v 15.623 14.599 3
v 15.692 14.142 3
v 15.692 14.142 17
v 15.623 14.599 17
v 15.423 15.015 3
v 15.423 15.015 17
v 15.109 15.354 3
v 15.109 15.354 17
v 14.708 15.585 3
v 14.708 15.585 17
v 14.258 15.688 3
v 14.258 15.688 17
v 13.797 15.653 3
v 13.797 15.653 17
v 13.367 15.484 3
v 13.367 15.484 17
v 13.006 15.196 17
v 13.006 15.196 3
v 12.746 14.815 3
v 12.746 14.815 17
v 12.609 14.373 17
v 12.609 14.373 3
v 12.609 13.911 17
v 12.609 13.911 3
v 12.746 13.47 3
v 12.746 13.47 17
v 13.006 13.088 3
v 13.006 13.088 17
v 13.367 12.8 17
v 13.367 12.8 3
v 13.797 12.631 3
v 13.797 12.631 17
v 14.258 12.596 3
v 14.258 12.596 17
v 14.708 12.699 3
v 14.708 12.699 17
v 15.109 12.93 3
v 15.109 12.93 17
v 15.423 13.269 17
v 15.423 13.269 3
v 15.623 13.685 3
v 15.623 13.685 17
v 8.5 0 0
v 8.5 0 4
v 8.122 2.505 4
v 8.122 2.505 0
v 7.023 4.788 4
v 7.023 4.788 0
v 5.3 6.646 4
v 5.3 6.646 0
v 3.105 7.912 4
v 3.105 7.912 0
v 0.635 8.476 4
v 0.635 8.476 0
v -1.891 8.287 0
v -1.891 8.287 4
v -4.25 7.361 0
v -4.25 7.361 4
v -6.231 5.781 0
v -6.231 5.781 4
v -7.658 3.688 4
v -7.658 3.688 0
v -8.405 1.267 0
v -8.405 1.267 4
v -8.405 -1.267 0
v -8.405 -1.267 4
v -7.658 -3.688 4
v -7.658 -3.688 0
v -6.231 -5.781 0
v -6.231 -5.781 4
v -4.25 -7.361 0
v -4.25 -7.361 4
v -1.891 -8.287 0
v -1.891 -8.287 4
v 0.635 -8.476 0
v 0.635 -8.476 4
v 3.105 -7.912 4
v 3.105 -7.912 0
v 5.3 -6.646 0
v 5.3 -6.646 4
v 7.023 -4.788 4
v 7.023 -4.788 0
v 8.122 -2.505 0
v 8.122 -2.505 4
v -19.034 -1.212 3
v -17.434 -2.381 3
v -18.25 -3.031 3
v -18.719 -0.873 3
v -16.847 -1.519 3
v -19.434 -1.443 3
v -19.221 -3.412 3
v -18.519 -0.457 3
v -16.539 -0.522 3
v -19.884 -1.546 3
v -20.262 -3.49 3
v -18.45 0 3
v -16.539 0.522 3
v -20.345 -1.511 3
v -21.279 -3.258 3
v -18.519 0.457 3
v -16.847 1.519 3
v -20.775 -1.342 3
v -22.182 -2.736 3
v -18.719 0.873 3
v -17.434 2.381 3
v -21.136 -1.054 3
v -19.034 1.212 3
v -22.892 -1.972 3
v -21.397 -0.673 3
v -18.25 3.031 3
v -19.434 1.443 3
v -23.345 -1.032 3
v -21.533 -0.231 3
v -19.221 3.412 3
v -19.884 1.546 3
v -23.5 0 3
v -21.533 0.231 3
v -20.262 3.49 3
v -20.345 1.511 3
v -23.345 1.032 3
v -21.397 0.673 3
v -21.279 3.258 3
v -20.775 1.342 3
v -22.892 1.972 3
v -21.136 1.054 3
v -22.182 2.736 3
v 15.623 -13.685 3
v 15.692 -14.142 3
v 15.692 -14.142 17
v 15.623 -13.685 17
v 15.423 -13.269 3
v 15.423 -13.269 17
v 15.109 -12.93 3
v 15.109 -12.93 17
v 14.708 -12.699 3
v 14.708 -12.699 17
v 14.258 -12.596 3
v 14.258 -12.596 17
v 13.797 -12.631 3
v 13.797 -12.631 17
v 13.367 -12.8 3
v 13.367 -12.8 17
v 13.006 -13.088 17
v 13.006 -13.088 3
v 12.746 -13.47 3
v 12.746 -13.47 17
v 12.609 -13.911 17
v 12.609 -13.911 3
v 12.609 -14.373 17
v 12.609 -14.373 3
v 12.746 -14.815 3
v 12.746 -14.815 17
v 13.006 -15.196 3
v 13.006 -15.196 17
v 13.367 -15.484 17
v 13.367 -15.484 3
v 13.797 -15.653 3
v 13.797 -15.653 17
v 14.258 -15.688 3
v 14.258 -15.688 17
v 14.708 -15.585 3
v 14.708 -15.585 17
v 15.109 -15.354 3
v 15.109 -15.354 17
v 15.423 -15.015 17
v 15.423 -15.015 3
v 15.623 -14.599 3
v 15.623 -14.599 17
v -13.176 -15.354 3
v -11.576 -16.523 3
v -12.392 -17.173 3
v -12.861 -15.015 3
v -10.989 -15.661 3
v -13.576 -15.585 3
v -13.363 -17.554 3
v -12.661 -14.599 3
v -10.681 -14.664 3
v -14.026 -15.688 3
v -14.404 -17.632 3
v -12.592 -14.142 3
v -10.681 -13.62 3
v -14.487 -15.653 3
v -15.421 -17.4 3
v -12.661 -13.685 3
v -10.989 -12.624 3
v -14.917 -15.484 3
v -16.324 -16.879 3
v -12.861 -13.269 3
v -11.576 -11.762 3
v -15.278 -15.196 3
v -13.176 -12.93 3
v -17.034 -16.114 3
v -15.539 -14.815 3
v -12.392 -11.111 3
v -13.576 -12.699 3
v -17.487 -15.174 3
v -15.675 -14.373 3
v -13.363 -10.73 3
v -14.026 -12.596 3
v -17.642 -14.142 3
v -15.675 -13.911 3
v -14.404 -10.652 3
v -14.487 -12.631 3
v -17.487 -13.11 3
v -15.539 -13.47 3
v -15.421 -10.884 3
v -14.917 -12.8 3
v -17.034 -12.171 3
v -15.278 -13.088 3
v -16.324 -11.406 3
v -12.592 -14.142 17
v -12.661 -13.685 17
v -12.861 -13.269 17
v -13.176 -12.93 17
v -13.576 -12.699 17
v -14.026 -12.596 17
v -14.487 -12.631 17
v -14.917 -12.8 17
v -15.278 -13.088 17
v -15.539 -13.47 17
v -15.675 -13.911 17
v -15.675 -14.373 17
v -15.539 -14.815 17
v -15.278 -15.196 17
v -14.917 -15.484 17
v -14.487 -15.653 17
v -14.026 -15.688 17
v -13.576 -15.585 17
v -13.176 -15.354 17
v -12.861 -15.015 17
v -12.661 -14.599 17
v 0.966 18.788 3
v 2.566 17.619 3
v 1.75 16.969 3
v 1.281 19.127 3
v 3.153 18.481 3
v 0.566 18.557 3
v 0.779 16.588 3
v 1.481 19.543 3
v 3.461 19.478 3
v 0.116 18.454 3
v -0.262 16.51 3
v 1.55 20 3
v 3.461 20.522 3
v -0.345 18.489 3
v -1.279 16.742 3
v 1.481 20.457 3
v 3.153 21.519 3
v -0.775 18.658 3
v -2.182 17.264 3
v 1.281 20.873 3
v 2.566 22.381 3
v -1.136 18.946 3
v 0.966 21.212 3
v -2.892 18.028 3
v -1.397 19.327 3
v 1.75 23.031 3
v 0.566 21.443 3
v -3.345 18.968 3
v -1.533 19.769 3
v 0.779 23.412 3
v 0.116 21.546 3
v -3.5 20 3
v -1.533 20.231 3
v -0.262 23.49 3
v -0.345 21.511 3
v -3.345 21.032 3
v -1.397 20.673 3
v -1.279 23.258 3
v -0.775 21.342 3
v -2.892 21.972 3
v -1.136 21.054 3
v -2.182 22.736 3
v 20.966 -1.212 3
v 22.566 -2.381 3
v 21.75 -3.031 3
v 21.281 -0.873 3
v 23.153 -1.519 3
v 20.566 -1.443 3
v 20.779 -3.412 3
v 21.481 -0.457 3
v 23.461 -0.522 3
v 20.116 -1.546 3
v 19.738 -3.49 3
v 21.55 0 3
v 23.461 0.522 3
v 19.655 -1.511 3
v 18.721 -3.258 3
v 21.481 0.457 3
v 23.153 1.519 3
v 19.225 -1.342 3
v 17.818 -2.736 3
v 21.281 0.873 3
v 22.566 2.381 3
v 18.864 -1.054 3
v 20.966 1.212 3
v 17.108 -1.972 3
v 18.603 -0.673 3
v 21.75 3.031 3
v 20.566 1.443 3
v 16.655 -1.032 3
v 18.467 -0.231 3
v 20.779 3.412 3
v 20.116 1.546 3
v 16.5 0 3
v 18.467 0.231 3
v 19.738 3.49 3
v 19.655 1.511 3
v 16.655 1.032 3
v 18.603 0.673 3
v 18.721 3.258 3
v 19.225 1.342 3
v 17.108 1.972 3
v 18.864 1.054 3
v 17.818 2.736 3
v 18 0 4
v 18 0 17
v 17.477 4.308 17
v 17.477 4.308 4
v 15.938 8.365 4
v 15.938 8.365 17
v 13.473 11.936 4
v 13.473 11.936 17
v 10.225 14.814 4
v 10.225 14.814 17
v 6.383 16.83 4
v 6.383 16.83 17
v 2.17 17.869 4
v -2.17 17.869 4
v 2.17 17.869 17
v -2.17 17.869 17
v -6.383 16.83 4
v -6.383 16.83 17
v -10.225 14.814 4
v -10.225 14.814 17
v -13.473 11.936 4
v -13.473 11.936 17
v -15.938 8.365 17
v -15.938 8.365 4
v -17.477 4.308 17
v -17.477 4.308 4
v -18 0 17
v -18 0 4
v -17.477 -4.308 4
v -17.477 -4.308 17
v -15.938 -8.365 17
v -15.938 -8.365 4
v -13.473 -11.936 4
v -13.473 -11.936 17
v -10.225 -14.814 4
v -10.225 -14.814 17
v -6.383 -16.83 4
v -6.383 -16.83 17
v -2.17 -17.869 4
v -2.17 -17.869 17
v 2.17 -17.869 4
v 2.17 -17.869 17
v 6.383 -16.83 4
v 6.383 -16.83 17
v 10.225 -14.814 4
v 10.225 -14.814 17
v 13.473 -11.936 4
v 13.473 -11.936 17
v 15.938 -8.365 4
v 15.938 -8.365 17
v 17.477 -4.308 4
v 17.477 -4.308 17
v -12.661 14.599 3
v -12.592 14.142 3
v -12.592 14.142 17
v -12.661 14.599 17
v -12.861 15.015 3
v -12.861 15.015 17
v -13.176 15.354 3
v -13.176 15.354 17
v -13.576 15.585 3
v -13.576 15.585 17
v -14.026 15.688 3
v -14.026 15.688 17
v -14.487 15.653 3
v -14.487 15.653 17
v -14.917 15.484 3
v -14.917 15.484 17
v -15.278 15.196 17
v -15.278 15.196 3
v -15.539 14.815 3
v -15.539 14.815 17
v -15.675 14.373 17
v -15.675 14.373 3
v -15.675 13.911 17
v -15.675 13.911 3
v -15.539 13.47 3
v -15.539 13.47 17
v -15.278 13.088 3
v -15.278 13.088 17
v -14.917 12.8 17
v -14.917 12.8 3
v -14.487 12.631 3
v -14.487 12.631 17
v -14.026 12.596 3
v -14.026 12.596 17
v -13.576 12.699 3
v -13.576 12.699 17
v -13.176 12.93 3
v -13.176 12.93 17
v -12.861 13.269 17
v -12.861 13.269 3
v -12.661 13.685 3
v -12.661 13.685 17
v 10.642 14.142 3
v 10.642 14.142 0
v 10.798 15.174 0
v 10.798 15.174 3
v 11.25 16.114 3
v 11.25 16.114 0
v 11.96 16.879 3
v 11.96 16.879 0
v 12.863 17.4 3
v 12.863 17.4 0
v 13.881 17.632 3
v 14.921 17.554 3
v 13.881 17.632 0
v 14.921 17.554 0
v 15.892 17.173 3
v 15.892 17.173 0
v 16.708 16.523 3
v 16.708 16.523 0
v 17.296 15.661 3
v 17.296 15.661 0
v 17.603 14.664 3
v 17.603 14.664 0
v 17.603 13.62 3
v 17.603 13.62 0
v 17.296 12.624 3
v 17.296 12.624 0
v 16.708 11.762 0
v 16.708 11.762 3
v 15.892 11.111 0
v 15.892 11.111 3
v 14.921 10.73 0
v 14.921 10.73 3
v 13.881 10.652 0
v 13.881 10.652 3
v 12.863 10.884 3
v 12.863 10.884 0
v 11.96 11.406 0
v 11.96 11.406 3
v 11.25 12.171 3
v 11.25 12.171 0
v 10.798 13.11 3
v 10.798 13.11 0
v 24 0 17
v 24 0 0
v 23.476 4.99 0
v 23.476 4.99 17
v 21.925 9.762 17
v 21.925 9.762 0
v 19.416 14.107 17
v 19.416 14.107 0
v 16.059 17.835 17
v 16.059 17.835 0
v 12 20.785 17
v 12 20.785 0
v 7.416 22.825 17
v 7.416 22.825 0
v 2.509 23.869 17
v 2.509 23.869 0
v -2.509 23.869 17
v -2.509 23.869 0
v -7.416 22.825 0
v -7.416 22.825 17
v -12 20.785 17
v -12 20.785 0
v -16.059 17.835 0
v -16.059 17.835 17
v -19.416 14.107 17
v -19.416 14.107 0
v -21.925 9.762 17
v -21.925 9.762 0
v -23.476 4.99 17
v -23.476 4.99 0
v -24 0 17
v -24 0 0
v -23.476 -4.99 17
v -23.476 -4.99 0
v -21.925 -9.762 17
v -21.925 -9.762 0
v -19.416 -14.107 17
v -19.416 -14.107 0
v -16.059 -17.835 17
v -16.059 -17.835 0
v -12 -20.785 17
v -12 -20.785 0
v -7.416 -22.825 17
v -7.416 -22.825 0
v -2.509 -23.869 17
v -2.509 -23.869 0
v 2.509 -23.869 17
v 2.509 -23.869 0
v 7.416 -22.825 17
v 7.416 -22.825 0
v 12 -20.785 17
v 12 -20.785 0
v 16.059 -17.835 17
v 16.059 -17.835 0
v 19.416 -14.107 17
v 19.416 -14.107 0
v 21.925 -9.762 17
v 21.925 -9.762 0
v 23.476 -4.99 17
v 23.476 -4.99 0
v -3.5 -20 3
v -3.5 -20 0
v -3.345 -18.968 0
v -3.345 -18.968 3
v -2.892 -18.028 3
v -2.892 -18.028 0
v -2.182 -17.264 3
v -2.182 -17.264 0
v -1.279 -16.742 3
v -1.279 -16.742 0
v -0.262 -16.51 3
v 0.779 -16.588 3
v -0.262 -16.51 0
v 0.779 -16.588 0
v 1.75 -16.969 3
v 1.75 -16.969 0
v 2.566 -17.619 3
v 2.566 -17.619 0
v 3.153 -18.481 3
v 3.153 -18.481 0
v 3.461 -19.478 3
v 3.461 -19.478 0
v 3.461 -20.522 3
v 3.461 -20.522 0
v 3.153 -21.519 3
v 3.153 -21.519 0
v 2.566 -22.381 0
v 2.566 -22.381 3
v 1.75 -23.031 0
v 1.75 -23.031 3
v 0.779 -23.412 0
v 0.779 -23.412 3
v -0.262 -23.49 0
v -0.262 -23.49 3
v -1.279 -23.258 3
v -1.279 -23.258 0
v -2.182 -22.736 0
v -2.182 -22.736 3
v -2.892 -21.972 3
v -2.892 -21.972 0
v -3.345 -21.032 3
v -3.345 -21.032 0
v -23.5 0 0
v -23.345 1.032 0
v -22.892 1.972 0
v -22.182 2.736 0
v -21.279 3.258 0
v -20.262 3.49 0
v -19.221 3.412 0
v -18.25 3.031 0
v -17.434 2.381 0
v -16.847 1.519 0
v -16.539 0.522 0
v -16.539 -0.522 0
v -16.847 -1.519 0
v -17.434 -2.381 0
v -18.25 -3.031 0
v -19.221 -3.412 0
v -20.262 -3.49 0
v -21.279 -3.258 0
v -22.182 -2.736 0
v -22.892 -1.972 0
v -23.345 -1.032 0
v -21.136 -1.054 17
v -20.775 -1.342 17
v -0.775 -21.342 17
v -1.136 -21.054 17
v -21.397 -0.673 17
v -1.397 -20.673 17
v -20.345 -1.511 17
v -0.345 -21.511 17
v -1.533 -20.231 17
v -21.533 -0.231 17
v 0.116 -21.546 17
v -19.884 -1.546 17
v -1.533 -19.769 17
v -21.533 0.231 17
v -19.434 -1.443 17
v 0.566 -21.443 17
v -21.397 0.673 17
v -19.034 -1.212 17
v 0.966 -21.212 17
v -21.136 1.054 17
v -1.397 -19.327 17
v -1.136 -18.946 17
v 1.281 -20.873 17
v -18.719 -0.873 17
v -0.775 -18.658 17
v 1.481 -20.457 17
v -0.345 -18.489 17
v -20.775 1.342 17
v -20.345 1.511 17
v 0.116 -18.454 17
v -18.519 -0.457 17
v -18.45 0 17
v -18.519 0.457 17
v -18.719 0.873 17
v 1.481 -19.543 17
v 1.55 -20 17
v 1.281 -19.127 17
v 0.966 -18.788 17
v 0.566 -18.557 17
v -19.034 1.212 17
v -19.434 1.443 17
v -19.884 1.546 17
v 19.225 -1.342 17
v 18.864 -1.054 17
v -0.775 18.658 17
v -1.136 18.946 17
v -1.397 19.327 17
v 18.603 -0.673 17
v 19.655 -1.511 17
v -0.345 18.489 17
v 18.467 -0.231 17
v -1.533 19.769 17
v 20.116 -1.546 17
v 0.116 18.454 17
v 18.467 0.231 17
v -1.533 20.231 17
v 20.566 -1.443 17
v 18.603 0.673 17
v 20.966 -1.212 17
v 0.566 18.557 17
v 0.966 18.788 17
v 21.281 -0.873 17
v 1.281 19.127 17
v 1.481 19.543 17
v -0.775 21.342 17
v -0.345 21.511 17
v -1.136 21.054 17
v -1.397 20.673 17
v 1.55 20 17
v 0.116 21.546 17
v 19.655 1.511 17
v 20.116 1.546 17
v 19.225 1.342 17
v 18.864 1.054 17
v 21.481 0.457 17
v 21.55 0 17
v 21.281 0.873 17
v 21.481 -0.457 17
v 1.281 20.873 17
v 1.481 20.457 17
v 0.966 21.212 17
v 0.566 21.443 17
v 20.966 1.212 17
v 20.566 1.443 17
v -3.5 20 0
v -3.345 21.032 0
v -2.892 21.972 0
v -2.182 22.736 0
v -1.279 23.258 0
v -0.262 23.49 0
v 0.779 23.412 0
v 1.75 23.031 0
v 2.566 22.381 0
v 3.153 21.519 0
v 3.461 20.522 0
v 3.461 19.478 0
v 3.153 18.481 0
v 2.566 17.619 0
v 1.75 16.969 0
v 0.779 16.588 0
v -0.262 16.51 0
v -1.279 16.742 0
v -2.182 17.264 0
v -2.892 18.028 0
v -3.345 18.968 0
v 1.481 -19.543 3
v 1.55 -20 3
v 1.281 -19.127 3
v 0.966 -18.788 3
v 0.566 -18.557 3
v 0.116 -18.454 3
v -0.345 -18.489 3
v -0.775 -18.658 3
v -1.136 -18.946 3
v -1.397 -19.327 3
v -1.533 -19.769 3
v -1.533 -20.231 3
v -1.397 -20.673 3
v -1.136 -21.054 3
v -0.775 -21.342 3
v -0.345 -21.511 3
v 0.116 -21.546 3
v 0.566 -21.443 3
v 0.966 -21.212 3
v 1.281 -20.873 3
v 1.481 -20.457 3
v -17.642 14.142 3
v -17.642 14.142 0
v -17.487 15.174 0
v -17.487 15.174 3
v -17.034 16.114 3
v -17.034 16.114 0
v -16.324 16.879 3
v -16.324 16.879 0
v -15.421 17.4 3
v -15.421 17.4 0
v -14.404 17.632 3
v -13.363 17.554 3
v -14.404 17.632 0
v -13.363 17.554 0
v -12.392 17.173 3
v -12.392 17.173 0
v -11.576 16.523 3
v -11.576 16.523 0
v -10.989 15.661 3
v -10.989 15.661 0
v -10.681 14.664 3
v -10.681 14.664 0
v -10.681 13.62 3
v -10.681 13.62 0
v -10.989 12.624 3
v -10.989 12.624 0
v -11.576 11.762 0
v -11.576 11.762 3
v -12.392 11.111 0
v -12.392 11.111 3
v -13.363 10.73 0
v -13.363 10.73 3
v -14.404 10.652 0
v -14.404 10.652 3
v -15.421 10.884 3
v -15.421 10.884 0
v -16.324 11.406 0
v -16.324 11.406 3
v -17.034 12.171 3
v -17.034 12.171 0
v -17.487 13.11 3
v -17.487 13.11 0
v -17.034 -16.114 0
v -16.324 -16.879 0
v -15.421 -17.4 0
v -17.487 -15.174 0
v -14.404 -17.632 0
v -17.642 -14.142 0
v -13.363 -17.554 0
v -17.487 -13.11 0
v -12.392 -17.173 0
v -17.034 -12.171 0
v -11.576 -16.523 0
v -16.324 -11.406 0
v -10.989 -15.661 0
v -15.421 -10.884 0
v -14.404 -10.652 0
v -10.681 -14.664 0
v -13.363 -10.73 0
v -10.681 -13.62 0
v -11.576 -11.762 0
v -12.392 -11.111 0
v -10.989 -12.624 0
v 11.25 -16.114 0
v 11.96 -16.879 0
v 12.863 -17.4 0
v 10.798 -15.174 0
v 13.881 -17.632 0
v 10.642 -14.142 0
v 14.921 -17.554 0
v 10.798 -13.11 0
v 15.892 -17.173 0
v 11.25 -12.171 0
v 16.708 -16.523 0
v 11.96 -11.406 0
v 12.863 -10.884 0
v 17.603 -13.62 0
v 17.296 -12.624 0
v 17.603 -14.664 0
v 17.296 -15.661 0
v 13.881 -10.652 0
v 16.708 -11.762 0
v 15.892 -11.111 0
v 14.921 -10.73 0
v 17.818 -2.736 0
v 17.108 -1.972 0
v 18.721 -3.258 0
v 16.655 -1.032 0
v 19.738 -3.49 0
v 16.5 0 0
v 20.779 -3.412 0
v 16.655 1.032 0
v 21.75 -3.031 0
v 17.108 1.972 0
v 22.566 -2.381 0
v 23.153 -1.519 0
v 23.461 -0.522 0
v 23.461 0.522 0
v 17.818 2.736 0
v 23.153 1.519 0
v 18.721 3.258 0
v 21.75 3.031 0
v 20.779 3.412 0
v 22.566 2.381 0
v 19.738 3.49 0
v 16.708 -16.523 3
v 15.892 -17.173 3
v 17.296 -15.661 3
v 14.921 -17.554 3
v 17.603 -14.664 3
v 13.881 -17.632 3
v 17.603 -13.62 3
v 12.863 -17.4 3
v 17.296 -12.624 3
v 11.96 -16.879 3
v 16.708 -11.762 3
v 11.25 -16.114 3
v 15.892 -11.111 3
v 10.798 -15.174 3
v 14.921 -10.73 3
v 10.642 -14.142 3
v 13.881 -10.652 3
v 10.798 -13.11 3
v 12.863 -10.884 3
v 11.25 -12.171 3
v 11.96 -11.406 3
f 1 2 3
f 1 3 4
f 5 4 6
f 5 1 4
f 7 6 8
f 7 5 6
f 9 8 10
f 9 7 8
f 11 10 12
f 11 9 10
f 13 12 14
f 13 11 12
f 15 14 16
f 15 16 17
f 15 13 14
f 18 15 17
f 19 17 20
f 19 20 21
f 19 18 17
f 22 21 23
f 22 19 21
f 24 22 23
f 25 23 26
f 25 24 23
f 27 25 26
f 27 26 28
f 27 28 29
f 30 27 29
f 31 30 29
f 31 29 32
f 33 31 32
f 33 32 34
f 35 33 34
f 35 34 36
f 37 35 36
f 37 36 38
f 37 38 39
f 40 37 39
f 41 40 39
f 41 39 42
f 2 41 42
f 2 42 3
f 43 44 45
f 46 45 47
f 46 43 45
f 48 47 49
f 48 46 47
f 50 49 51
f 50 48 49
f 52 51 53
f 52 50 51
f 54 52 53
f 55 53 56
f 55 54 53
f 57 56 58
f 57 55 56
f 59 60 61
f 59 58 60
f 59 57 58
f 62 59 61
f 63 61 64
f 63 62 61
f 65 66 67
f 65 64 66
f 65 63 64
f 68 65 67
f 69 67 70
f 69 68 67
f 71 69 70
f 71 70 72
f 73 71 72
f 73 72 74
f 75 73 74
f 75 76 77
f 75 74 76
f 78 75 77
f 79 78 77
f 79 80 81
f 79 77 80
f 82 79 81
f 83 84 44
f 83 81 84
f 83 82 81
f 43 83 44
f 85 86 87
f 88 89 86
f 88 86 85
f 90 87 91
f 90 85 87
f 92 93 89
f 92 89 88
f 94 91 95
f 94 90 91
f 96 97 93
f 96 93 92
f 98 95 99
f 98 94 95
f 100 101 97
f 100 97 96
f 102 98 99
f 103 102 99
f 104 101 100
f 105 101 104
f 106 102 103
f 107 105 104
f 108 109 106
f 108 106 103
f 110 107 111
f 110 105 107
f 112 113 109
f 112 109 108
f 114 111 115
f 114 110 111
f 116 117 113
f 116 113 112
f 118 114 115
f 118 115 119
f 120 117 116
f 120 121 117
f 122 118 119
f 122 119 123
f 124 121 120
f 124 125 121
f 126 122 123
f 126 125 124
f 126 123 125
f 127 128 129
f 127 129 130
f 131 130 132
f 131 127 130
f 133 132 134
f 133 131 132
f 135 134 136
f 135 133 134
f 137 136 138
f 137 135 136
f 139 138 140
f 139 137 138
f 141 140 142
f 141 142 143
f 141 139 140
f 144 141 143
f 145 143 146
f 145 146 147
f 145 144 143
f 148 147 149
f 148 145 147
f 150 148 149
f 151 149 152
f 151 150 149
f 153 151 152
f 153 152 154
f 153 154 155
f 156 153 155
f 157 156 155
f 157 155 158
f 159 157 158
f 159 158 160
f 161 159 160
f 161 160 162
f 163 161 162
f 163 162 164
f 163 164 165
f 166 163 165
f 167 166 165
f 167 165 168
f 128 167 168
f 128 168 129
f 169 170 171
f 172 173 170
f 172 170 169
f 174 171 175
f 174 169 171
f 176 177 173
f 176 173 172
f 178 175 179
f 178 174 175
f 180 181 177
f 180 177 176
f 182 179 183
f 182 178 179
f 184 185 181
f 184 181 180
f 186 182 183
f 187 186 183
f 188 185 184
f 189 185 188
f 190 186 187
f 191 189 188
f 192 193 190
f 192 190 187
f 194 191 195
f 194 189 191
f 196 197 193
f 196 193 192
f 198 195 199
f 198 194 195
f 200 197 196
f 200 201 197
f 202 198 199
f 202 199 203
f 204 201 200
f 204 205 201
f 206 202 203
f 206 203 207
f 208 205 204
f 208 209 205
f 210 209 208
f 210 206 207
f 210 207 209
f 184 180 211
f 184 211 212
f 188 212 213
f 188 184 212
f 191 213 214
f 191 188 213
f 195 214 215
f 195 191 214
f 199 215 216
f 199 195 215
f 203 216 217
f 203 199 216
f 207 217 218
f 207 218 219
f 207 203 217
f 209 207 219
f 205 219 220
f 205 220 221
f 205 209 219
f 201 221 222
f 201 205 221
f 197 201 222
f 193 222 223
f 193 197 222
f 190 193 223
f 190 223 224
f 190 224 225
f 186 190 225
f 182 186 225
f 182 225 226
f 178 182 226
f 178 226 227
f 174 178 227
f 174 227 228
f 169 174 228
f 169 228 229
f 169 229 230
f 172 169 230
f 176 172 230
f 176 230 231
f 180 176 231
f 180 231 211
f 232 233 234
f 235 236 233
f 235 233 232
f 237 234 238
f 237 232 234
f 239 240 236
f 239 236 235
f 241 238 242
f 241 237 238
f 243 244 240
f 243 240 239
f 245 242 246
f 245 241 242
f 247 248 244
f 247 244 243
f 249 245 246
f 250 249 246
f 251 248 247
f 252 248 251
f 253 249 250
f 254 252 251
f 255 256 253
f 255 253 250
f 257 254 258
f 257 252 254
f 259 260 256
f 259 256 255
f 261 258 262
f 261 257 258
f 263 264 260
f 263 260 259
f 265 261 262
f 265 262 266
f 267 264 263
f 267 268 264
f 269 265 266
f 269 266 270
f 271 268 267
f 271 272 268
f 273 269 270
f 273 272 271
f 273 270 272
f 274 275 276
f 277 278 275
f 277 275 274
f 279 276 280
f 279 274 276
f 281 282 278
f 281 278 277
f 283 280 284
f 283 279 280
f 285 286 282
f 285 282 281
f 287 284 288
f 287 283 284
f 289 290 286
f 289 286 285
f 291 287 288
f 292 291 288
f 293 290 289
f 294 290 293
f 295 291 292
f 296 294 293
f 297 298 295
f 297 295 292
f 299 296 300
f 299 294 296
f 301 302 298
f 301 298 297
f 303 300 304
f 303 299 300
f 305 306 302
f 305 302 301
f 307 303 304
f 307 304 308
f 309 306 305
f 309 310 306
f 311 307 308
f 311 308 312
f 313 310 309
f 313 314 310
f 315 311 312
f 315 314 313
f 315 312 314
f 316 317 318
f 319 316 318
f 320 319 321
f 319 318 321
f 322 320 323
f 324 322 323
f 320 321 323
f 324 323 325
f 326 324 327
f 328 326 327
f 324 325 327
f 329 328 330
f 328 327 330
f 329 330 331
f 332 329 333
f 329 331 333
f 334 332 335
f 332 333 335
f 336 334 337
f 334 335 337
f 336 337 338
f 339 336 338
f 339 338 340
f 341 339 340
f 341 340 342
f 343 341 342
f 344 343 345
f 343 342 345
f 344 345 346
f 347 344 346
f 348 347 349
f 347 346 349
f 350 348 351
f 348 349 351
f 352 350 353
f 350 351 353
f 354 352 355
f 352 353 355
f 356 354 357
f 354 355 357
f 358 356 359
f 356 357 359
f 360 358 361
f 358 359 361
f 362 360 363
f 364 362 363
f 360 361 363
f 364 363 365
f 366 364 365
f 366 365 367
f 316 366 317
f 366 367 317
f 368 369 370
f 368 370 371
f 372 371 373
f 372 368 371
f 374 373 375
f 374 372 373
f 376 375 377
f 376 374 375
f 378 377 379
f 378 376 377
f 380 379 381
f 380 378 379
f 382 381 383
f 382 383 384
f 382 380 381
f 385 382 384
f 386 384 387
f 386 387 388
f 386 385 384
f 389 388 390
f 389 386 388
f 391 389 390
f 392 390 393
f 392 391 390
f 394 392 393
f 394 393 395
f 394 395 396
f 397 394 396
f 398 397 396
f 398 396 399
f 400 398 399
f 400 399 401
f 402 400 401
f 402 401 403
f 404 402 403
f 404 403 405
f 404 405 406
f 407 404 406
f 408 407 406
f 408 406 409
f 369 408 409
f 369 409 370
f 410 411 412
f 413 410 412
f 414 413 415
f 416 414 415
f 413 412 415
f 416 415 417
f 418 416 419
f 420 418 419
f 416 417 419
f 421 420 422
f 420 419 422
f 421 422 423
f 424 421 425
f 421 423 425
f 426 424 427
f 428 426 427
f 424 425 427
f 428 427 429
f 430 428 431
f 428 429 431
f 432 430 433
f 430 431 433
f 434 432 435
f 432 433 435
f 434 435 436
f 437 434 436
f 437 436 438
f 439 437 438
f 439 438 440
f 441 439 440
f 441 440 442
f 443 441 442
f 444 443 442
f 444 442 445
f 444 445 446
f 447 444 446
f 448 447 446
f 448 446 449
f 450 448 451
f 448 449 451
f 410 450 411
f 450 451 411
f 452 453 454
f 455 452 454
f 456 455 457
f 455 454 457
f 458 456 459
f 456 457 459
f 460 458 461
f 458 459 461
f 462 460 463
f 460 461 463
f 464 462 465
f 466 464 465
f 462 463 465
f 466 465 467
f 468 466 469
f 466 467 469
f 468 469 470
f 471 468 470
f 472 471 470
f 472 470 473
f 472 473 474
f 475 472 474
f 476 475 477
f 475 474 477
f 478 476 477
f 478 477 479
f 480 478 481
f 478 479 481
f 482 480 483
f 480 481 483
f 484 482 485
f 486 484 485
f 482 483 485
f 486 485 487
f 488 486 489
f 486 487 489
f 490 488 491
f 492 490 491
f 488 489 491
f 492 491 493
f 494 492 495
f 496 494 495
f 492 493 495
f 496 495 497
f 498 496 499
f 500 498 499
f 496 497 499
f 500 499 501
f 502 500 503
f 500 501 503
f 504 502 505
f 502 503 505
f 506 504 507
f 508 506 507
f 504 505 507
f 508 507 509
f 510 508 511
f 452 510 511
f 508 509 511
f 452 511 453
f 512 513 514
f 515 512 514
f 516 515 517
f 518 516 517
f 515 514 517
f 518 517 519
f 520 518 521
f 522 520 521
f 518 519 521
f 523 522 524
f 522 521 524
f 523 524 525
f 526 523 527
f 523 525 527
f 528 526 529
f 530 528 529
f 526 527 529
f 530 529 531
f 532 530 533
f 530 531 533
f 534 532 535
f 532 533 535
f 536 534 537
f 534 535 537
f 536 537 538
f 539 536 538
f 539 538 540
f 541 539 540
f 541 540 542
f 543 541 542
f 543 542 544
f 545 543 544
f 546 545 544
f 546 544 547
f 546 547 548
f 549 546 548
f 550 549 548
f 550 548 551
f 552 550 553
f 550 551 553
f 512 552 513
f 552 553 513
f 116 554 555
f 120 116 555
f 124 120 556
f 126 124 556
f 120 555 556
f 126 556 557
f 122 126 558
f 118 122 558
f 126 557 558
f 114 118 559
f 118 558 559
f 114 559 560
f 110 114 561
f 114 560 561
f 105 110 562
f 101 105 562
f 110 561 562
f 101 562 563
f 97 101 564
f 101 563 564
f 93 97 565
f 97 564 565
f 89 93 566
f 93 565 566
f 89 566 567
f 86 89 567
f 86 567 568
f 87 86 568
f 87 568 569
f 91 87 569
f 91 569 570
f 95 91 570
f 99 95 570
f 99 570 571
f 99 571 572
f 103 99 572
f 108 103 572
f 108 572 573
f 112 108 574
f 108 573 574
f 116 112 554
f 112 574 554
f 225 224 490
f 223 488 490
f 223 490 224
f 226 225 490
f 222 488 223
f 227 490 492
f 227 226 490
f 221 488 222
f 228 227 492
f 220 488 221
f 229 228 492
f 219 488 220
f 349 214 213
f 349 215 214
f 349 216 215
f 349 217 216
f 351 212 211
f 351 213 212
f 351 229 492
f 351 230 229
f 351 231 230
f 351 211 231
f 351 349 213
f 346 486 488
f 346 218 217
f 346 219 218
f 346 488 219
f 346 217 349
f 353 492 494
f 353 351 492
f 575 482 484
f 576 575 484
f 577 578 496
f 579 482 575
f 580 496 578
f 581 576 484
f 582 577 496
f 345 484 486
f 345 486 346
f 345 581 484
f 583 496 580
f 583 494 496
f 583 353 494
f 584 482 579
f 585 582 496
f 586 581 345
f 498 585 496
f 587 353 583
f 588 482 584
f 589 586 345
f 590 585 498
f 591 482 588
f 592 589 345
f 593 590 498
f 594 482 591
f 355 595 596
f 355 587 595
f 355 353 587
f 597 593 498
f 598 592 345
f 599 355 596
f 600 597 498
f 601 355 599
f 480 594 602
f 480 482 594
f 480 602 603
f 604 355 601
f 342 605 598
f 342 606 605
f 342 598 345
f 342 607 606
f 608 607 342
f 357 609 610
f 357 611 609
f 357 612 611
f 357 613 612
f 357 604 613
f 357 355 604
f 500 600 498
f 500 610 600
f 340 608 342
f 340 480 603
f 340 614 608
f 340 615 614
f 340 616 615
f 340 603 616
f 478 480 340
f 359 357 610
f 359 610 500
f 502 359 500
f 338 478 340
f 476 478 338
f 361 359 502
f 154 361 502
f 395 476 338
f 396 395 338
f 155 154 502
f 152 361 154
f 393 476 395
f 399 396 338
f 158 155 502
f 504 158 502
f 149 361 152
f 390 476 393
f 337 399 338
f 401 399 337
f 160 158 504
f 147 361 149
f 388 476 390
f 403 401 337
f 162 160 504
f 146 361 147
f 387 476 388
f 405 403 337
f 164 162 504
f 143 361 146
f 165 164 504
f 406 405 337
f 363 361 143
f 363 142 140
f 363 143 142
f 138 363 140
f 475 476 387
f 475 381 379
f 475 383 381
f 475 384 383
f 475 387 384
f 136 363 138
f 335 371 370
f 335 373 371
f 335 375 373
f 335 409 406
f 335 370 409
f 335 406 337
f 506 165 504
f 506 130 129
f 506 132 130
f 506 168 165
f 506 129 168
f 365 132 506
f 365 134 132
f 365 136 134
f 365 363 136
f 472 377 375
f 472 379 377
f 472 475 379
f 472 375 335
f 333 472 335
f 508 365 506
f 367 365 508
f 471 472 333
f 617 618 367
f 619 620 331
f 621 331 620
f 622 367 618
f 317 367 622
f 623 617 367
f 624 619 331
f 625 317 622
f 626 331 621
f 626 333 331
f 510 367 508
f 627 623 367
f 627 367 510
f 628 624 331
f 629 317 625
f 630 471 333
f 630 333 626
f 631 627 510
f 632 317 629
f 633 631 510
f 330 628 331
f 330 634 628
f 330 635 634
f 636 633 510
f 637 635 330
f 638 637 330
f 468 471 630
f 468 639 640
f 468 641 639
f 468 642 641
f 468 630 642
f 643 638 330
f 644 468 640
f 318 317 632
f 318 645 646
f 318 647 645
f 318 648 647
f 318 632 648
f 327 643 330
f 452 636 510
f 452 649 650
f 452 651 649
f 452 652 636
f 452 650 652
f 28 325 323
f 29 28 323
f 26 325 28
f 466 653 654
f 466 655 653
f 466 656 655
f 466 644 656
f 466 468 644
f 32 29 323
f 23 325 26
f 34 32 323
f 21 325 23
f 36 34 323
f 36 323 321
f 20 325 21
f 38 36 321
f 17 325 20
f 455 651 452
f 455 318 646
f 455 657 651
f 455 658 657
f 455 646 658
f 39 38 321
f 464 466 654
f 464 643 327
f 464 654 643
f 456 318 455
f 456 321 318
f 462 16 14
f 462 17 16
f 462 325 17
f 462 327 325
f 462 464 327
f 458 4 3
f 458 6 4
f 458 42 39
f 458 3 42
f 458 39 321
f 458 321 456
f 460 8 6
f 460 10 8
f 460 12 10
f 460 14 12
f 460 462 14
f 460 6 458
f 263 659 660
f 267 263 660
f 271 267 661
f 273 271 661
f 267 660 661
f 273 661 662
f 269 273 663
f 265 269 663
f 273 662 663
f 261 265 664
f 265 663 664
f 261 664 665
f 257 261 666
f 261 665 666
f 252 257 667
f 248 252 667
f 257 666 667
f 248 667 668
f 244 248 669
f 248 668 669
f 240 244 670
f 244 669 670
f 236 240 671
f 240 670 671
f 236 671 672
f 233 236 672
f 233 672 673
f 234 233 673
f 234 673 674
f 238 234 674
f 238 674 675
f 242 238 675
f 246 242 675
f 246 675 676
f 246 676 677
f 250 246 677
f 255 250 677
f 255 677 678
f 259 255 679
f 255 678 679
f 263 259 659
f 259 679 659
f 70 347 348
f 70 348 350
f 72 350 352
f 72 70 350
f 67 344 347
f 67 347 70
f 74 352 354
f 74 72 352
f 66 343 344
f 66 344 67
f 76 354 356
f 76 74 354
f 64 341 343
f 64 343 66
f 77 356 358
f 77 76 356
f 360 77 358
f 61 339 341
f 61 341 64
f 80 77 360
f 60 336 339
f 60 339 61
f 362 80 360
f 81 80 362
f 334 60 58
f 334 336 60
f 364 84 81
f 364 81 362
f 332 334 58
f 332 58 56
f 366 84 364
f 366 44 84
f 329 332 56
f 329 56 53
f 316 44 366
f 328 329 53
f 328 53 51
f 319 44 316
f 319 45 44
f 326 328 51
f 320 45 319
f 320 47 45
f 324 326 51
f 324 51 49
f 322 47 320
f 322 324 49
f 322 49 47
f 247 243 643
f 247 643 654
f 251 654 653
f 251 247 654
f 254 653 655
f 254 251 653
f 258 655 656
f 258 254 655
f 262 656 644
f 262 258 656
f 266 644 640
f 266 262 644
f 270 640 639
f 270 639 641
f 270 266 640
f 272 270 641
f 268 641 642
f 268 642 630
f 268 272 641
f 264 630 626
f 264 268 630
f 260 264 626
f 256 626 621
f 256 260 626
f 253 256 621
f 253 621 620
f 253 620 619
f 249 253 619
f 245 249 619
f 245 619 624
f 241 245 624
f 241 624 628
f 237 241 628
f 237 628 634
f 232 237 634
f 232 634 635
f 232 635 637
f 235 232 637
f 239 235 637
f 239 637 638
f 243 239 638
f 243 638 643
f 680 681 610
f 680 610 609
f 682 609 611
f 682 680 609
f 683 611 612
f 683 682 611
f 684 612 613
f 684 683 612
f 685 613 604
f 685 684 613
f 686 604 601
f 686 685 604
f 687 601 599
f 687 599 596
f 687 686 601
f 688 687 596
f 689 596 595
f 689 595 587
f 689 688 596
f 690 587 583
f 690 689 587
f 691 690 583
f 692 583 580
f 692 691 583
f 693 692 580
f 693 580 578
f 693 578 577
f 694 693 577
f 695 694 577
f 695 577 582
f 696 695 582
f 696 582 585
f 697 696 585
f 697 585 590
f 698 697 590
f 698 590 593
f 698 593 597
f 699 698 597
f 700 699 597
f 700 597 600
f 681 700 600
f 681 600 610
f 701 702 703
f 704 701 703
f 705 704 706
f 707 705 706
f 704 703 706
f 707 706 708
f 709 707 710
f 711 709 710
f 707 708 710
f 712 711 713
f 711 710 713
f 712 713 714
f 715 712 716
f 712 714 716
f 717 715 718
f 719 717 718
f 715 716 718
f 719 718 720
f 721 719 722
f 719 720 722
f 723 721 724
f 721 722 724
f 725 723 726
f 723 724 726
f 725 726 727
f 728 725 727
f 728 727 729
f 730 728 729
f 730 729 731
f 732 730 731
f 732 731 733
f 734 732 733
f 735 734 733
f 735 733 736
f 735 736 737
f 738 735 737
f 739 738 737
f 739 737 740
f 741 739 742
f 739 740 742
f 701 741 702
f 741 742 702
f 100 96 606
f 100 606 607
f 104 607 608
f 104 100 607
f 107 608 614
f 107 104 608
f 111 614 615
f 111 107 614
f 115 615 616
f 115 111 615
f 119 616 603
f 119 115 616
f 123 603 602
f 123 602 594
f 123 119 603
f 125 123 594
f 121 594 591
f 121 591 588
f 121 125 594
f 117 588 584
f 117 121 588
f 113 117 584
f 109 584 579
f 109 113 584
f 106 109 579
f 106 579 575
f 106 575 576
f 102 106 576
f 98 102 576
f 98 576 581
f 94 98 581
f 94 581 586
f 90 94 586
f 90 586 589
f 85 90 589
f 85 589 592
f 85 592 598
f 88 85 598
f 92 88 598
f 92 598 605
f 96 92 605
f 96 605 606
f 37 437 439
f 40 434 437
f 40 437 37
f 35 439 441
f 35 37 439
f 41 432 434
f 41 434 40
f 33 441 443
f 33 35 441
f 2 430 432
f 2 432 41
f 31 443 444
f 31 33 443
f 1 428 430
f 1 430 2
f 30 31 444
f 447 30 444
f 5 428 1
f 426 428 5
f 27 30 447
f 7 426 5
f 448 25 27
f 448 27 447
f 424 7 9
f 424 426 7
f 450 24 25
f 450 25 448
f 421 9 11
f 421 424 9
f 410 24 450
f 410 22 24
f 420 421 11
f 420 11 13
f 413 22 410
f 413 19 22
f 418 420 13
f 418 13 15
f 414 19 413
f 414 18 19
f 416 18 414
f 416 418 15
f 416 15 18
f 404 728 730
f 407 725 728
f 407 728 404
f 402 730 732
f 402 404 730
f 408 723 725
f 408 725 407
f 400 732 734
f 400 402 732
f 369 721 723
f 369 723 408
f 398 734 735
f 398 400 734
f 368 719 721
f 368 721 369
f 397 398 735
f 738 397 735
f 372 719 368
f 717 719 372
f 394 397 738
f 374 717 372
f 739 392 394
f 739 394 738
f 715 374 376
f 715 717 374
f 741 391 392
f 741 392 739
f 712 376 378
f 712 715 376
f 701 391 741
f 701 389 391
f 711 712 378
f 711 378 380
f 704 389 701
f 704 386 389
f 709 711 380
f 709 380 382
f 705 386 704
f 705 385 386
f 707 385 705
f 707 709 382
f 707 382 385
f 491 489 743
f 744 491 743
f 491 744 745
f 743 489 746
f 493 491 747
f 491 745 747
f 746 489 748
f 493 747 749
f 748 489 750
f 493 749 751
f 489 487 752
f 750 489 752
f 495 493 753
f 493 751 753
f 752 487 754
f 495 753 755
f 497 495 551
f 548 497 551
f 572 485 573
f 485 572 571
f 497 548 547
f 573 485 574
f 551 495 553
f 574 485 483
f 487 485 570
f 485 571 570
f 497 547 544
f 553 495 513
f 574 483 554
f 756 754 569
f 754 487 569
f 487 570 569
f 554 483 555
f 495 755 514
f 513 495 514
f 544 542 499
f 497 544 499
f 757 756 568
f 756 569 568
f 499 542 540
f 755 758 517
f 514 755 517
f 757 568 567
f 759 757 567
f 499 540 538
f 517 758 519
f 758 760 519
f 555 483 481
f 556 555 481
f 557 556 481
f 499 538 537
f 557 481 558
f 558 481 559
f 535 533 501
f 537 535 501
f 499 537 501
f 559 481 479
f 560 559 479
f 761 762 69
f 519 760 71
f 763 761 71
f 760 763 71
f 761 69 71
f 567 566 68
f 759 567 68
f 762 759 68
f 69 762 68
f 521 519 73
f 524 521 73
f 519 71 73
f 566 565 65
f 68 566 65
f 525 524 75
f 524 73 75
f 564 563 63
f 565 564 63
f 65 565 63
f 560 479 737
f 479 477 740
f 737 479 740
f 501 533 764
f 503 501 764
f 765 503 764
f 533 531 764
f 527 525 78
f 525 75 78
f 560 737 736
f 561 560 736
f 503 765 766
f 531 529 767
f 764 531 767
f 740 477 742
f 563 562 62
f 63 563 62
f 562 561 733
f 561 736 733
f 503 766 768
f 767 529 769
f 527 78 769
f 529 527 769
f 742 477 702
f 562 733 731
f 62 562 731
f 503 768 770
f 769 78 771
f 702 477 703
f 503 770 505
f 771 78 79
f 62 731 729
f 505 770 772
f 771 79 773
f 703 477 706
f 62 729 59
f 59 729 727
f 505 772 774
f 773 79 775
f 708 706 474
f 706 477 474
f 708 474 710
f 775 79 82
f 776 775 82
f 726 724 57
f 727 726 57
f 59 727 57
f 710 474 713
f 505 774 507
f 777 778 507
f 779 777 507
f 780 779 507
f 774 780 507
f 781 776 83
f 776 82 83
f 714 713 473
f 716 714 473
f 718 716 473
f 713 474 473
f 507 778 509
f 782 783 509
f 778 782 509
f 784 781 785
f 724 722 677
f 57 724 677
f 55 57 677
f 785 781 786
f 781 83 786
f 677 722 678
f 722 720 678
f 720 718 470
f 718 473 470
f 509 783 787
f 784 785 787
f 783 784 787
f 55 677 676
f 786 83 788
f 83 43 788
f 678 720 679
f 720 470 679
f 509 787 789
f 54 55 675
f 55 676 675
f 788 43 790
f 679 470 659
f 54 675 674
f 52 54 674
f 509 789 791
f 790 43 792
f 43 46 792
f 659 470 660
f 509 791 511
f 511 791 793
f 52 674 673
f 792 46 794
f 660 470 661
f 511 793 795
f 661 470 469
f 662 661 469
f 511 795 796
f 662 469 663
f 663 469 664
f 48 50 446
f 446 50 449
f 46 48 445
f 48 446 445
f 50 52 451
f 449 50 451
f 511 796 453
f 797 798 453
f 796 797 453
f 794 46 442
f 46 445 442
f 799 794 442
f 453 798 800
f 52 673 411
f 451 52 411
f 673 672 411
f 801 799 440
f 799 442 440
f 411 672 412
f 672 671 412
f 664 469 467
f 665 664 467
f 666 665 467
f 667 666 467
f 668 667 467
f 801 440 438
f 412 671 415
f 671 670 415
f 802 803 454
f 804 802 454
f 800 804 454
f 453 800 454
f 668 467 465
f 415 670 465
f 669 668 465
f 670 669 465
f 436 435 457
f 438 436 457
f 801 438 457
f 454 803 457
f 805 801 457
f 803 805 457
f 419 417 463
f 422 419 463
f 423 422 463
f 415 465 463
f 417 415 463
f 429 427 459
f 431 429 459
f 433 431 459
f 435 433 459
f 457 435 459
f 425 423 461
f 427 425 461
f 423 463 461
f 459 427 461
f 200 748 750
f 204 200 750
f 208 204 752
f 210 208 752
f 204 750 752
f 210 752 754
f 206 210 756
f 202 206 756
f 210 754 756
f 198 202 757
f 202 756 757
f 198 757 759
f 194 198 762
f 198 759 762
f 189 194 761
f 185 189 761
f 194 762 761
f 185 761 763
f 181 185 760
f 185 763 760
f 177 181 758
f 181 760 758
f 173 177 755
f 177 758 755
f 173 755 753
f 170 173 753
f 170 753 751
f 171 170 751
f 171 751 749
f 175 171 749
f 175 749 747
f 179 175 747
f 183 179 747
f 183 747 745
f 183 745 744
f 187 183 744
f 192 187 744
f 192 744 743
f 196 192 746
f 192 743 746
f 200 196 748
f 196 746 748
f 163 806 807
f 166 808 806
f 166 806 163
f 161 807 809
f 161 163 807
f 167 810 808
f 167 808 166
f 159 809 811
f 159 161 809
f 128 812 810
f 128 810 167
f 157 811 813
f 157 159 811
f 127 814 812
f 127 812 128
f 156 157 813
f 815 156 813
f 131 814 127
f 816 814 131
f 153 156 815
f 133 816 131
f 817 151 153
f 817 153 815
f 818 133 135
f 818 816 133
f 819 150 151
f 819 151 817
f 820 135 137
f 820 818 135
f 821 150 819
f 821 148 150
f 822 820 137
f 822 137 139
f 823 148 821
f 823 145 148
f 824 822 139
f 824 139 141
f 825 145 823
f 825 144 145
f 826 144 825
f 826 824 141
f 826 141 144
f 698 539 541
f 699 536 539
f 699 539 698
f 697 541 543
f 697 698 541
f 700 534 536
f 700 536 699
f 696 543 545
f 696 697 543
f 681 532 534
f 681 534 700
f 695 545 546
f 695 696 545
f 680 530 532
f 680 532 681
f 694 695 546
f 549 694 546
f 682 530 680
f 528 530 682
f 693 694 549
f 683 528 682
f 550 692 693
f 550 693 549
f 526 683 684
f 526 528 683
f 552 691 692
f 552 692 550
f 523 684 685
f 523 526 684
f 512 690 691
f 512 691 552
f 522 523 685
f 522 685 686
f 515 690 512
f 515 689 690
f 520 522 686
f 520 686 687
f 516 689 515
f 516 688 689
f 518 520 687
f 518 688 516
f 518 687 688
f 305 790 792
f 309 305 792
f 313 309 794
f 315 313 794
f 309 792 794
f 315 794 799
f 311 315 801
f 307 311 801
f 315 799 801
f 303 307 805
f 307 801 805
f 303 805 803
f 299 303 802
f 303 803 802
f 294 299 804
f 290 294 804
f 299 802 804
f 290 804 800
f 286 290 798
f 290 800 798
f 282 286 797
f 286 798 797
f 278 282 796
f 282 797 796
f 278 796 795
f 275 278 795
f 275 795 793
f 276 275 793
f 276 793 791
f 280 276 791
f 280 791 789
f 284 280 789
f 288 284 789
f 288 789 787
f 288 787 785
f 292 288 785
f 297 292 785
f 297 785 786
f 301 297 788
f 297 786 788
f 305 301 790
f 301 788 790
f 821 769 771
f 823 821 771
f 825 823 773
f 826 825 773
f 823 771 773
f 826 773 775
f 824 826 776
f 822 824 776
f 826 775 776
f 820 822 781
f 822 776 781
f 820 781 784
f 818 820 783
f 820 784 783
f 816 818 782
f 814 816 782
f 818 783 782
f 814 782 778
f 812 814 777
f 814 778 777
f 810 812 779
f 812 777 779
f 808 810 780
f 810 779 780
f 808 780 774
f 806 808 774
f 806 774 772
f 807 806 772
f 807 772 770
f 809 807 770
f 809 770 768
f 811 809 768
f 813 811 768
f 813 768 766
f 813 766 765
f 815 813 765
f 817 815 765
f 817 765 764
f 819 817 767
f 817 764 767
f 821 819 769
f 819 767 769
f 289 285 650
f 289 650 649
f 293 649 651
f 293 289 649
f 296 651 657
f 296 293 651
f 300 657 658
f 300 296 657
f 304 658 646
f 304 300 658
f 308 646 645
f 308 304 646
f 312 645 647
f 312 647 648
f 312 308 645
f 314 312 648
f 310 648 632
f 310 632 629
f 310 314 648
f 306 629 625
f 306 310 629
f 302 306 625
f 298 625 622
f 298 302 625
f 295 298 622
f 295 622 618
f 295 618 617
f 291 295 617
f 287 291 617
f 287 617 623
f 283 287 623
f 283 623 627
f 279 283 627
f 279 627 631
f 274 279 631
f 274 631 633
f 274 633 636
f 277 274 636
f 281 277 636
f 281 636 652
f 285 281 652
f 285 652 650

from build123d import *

# Parameters (mm, degrees)
SKETCH6_R           = 24
SKETCH6_R_2         = 1.55
SKETCH6_R_3         = 8.5
BOSS_EXTRUDE1_DEPTH = 17
SKETCH8_R           = 3.5
CUT_EXTRUDE6_DEPTH  = 3
SKETCH9_R           = 18
CUT_EXTRUDE7_DEPTH  = 13


with BuildPart() as part:
    # Sketch6 → Boss-Extrude1 (new body)
    with BuildSketch(Plane.XY):
        Circle(SKETCH6_R)
        with Locations((0, 20)):
            Circle(SKETCH6_R_2, mode=Mode.SUBTRACT)
        with Locations((14.142135624, 14.142135624)):
            Circle(SKETCH6_R_2, mode=Mode.SUBTRACT)
        with Locations((20, 0)):
            Circle(SKETCH6_R_2, mode=Mode.SUBTRACT)
        with Locations((14.142135624, -14.142135624)):
            Circle(SKETCH6_R_2, mode=Mode.SUBTRACT)
        with Locations((0, -20)):
            Circle(SKETCH6_R_2, mode=Mode.SUBTRACT)
        with Locations((-14.142135624, -14.142135624)):
            Circle(SKETCH6_R_2, mode=Mode.SUBTRACT)
        with Locations((-20, 0)):
            Circle(SKETCH6_R_2, mode=Mode.SUBTRACT)
        with Locations((-14.142135624, 14.142135624)):
            Circle(SKETCH6_R_2, mode=Mode.SUBTRACT)
        Circle(SKETCH6_R_3, mode=Mode.SUBTRACT)
    extrude(amount=BOSS_EXTRUDE1_DEPTH)

    # Sketch8 → Cut-Extrude6 (cut)
    with BuildSketch(Plane(origin=(0, 0, 0), x_dir=(-1, 0, 0), z_dir=(0, 0, -1))):
        with Locations((0, 20)):
            Circle(SKETCH8_R)
        with Locations((14.142135624, 14.142135624)):
            Circle(SKETCH8_R)
        with Locations((20, 0)):
            Circle(SKETCH8_R)
        with Locations((14.142135624, -14.142135624)):
            Circle(SKETCH8_R)
        with Locations((0, -20)):
            Circle(SKETCH8_R)
        with Locations((-14.142135624, -14.142135624)):
            Circle(SKETCH8_R)
        with Locations((-20, 0)):
            Circle(SKETCH8_R)
        with Locations((-14.142135624, 14.142135624)):
            Circle(SKETCH8_R)
    extrude(amount=-CUT_EXTRUDE6_DEPTH, mode=Mode.SUBTRACT)

    # Sketch9 → Cut-Extrude7 (cut)
    with BuildSketch(Plane.XY.offset(17)):
        Circle(SKETCH9_R)
    extrude(amount=-CUT_EXTRUDE7_DEPTH, mode=Mode.SUBTRACT)


solid = part.part
